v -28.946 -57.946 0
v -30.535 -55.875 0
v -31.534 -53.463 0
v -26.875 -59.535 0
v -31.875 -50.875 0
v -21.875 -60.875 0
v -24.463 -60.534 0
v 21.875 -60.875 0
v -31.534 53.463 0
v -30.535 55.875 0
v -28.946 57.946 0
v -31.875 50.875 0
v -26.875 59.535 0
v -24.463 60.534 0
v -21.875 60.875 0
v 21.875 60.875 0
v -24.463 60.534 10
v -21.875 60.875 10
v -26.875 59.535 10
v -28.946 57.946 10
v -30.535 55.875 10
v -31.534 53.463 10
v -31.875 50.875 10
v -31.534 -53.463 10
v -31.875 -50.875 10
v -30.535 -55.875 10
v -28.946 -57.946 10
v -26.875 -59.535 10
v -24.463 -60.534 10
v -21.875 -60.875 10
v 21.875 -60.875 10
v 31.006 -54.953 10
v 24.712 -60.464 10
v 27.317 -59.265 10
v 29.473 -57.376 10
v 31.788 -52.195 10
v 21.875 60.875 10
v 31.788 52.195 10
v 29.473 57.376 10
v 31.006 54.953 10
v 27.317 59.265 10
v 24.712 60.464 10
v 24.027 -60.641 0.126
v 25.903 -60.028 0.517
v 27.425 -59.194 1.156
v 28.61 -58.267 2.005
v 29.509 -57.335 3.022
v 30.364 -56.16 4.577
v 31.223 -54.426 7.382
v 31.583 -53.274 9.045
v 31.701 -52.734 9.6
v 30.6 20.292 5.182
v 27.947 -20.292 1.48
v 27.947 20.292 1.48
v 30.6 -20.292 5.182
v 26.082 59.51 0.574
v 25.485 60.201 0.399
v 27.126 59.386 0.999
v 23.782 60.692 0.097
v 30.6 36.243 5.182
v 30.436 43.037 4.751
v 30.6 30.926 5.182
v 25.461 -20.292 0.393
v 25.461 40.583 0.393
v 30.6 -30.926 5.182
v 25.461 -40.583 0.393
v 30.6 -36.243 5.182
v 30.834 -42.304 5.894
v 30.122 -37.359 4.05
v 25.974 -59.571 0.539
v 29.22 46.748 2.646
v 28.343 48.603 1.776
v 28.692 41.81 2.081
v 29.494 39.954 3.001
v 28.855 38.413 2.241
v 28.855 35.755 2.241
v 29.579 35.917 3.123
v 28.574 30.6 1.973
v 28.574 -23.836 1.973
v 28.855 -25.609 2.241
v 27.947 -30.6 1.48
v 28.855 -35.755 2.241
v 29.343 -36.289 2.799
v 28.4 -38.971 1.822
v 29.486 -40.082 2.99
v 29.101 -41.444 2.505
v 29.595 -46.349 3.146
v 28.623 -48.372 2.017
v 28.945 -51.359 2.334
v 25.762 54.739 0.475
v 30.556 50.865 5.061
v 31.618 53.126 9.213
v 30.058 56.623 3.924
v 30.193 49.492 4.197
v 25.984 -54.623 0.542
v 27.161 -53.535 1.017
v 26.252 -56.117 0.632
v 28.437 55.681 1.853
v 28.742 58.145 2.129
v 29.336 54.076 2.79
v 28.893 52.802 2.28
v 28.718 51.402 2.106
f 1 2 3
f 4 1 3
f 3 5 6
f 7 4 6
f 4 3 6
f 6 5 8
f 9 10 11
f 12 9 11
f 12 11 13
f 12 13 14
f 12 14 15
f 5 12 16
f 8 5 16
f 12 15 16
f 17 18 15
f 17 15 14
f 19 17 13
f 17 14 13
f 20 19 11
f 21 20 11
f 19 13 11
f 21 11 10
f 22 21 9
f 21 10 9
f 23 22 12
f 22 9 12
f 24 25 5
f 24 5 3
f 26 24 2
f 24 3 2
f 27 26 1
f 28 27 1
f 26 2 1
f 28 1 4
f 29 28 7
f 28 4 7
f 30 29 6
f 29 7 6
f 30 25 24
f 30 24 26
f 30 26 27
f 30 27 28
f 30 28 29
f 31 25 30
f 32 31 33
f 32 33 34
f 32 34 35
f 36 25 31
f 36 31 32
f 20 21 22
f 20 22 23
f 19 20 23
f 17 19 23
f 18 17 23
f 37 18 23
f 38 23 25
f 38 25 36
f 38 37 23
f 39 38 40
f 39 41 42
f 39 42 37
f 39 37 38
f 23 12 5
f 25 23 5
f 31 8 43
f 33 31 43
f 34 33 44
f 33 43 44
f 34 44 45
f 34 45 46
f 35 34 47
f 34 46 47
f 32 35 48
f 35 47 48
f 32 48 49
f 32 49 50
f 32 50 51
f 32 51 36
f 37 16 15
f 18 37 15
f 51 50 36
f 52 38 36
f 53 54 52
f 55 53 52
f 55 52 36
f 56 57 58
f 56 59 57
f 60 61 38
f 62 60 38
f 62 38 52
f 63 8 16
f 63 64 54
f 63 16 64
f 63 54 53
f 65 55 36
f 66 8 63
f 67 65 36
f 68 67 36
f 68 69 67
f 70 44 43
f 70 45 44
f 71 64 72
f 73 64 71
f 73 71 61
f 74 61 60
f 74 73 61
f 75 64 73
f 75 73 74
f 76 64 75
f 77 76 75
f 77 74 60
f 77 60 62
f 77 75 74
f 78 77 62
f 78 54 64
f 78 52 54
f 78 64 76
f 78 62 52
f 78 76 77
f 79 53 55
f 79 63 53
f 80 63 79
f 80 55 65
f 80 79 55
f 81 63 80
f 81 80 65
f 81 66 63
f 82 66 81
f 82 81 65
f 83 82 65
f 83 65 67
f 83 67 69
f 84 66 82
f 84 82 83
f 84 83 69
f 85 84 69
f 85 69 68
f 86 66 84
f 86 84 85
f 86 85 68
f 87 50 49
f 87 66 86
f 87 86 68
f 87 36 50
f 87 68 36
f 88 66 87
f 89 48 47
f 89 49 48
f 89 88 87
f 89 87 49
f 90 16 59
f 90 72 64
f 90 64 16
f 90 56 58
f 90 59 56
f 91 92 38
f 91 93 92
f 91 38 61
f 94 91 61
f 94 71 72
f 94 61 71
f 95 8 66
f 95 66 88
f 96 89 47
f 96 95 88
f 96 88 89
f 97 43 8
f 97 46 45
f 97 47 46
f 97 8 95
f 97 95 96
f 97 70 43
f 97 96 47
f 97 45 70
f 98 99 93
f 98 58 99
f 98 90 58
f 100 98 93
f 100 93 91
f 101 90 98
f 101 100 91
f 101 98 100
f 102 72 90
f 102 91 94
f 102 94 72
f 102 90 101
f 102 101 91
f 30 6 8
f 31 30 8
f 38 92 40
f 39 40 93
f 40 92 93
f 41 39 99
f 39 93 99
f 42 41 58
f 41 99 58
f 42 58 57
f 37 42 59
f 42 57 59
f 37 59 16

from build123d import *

# Parameters (mm, degrees)
F1_DEPTH = 10
F3_DEPTH = 123.8


with BuildPart() as f1:
    # F0 (on Top) → F1 (new body)
    with BuildSketch(Plane.XY):
        with BuildLine():
            Line((21.875, 60.875), (-21.875, 60.875))
            ThreePointArc((-21.875, 60.875), (-28.9460678119, 57.9460678119), (-31.875, 50.875))
            Line((-31.875, 50.875), (-31.875, -50.875))
            ThreePointArc((-31.875, -50.875), (-28.9460678119, -57.9460678119), (-21.875, -60.875))
            Line((-21.875, -60.875), (21.875, -60.875))
            ThreePointArc((21.875, -60.875), (28.9460678119, -57.9460678119), (31.875, -50.875))
            Line((31.875, -50.875), (31.875, 50.875))
            ThreePointArc((31.875, 50.875), (28.9460678119, 57.9460678119), (21.875, 60.875))
        make_face()
    extrude(amount=F1_DEPTH)

    # F2 (on face) → F3 (cut, symmetric)
    with BuildSketch(Plane.XZ.offset(60.875)):
        with BuildLine():
            add(Edge.make_bspline(
                [(21.875, 0), (30.6683350354, 0), (30.6994896382, 5.4293456487), (31.9338776171, 10.6412107125)],
                knots=[0, 0, 0, 0, 14.6429636462, 14.6429636462, 14.6429636462, 14.6429636462], degree=3))
            Line((21.875, 0), (31.9338776171, 0))
            Line((31.9338776171, 0), (31.9338776171, 10.6412107125))
        make_face()
    extrude(amount=F3_DEPTH, both=True, mode=Mode.SUBTRACT)


solid = f1.part
